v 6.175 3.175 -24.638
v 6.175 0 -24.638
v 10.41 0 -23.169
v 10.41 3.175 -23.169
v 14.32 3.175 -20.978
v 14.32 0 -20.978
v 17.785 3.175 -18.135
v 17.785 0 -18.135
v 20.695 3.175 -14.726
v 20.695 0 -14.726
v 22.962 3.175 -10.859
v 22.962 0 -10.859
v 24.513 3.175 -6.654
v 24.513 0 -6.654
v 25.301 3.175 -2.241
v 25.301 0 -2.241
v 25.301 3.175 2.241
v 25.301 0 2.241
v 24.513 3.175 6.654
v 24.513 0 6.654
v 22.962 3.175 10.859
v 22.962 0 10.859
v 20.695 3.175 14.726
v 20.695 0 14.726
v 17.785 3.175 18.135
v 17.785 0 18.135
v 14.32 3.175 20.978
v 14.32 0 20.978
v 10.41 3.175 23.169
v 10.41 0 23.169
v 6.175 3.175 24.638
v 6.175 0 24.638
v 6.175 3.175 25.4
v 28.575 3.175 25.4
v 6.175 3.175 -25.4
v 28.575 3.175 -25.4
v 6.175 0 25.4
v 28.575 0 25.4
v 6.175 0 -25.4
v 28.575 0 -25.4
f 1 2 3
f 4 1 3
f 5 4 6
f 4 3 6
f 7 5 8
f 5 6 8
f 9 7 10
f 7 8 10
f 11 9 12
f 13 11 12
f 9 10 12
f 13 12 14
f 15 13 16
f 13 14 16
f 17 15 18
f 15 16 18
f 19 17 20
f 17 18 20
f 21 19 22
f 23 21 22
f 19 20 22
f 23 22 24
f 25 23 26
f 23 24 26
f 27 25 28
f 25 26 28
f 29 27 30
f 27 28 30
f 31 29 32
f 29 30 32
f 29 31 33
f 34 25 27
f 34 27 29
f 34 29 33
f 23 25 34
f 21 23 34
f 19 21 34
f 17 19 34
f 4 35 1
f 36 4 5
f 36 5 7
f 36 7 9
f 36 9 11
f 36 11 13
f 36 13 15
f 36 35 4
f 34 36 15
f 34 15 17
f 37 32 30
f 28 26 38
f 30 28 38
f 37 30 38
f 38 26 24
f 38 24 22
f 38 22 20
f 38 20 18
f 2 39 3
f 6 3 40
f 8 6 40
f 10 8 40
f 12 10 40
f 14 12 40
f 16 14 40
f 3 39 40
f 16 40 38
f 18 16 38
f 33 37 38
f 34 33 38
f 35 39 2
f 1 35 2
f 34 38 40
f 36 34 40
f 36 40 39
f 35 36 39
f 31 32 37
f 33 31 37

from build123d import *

# Parameters (mm, degrees)
BOSS_EXTRUDE1_DEPTH = 3.175


with BuildPart() as part:
    # Sketch1 → Boss-Extrude1 (new body)
    with BuildSketch(Plane(origin=(0, 0, 0), x_dir=(1, 0, 0), z_dir=(0, 1, 0))):
        with BuildLine():
            Line((28.575, 25.4), (6.174864857, 25.4))
            Line((6.174864857, 25.4), (6.174864857, 24.638))
            ThreePointArc((6.174864857, 24.638), (20.025003962, 15.625594911), (25.4, 0))
            ThreePointArc((25.4, 0), (20.025003962, -15.625594911), (6.174864857, -24.638))
            Line((6.174864857, -24.638), (6.174864857, -25.4))
            Line((6.174864857, -25.4), (28.575, -25.4))
            Line((28.575, -25.4), (28.575, 25.4))
        make_face()
    extrude(amount=BOSS_EXTRUDE1_DEPTH)


solid = part.part
